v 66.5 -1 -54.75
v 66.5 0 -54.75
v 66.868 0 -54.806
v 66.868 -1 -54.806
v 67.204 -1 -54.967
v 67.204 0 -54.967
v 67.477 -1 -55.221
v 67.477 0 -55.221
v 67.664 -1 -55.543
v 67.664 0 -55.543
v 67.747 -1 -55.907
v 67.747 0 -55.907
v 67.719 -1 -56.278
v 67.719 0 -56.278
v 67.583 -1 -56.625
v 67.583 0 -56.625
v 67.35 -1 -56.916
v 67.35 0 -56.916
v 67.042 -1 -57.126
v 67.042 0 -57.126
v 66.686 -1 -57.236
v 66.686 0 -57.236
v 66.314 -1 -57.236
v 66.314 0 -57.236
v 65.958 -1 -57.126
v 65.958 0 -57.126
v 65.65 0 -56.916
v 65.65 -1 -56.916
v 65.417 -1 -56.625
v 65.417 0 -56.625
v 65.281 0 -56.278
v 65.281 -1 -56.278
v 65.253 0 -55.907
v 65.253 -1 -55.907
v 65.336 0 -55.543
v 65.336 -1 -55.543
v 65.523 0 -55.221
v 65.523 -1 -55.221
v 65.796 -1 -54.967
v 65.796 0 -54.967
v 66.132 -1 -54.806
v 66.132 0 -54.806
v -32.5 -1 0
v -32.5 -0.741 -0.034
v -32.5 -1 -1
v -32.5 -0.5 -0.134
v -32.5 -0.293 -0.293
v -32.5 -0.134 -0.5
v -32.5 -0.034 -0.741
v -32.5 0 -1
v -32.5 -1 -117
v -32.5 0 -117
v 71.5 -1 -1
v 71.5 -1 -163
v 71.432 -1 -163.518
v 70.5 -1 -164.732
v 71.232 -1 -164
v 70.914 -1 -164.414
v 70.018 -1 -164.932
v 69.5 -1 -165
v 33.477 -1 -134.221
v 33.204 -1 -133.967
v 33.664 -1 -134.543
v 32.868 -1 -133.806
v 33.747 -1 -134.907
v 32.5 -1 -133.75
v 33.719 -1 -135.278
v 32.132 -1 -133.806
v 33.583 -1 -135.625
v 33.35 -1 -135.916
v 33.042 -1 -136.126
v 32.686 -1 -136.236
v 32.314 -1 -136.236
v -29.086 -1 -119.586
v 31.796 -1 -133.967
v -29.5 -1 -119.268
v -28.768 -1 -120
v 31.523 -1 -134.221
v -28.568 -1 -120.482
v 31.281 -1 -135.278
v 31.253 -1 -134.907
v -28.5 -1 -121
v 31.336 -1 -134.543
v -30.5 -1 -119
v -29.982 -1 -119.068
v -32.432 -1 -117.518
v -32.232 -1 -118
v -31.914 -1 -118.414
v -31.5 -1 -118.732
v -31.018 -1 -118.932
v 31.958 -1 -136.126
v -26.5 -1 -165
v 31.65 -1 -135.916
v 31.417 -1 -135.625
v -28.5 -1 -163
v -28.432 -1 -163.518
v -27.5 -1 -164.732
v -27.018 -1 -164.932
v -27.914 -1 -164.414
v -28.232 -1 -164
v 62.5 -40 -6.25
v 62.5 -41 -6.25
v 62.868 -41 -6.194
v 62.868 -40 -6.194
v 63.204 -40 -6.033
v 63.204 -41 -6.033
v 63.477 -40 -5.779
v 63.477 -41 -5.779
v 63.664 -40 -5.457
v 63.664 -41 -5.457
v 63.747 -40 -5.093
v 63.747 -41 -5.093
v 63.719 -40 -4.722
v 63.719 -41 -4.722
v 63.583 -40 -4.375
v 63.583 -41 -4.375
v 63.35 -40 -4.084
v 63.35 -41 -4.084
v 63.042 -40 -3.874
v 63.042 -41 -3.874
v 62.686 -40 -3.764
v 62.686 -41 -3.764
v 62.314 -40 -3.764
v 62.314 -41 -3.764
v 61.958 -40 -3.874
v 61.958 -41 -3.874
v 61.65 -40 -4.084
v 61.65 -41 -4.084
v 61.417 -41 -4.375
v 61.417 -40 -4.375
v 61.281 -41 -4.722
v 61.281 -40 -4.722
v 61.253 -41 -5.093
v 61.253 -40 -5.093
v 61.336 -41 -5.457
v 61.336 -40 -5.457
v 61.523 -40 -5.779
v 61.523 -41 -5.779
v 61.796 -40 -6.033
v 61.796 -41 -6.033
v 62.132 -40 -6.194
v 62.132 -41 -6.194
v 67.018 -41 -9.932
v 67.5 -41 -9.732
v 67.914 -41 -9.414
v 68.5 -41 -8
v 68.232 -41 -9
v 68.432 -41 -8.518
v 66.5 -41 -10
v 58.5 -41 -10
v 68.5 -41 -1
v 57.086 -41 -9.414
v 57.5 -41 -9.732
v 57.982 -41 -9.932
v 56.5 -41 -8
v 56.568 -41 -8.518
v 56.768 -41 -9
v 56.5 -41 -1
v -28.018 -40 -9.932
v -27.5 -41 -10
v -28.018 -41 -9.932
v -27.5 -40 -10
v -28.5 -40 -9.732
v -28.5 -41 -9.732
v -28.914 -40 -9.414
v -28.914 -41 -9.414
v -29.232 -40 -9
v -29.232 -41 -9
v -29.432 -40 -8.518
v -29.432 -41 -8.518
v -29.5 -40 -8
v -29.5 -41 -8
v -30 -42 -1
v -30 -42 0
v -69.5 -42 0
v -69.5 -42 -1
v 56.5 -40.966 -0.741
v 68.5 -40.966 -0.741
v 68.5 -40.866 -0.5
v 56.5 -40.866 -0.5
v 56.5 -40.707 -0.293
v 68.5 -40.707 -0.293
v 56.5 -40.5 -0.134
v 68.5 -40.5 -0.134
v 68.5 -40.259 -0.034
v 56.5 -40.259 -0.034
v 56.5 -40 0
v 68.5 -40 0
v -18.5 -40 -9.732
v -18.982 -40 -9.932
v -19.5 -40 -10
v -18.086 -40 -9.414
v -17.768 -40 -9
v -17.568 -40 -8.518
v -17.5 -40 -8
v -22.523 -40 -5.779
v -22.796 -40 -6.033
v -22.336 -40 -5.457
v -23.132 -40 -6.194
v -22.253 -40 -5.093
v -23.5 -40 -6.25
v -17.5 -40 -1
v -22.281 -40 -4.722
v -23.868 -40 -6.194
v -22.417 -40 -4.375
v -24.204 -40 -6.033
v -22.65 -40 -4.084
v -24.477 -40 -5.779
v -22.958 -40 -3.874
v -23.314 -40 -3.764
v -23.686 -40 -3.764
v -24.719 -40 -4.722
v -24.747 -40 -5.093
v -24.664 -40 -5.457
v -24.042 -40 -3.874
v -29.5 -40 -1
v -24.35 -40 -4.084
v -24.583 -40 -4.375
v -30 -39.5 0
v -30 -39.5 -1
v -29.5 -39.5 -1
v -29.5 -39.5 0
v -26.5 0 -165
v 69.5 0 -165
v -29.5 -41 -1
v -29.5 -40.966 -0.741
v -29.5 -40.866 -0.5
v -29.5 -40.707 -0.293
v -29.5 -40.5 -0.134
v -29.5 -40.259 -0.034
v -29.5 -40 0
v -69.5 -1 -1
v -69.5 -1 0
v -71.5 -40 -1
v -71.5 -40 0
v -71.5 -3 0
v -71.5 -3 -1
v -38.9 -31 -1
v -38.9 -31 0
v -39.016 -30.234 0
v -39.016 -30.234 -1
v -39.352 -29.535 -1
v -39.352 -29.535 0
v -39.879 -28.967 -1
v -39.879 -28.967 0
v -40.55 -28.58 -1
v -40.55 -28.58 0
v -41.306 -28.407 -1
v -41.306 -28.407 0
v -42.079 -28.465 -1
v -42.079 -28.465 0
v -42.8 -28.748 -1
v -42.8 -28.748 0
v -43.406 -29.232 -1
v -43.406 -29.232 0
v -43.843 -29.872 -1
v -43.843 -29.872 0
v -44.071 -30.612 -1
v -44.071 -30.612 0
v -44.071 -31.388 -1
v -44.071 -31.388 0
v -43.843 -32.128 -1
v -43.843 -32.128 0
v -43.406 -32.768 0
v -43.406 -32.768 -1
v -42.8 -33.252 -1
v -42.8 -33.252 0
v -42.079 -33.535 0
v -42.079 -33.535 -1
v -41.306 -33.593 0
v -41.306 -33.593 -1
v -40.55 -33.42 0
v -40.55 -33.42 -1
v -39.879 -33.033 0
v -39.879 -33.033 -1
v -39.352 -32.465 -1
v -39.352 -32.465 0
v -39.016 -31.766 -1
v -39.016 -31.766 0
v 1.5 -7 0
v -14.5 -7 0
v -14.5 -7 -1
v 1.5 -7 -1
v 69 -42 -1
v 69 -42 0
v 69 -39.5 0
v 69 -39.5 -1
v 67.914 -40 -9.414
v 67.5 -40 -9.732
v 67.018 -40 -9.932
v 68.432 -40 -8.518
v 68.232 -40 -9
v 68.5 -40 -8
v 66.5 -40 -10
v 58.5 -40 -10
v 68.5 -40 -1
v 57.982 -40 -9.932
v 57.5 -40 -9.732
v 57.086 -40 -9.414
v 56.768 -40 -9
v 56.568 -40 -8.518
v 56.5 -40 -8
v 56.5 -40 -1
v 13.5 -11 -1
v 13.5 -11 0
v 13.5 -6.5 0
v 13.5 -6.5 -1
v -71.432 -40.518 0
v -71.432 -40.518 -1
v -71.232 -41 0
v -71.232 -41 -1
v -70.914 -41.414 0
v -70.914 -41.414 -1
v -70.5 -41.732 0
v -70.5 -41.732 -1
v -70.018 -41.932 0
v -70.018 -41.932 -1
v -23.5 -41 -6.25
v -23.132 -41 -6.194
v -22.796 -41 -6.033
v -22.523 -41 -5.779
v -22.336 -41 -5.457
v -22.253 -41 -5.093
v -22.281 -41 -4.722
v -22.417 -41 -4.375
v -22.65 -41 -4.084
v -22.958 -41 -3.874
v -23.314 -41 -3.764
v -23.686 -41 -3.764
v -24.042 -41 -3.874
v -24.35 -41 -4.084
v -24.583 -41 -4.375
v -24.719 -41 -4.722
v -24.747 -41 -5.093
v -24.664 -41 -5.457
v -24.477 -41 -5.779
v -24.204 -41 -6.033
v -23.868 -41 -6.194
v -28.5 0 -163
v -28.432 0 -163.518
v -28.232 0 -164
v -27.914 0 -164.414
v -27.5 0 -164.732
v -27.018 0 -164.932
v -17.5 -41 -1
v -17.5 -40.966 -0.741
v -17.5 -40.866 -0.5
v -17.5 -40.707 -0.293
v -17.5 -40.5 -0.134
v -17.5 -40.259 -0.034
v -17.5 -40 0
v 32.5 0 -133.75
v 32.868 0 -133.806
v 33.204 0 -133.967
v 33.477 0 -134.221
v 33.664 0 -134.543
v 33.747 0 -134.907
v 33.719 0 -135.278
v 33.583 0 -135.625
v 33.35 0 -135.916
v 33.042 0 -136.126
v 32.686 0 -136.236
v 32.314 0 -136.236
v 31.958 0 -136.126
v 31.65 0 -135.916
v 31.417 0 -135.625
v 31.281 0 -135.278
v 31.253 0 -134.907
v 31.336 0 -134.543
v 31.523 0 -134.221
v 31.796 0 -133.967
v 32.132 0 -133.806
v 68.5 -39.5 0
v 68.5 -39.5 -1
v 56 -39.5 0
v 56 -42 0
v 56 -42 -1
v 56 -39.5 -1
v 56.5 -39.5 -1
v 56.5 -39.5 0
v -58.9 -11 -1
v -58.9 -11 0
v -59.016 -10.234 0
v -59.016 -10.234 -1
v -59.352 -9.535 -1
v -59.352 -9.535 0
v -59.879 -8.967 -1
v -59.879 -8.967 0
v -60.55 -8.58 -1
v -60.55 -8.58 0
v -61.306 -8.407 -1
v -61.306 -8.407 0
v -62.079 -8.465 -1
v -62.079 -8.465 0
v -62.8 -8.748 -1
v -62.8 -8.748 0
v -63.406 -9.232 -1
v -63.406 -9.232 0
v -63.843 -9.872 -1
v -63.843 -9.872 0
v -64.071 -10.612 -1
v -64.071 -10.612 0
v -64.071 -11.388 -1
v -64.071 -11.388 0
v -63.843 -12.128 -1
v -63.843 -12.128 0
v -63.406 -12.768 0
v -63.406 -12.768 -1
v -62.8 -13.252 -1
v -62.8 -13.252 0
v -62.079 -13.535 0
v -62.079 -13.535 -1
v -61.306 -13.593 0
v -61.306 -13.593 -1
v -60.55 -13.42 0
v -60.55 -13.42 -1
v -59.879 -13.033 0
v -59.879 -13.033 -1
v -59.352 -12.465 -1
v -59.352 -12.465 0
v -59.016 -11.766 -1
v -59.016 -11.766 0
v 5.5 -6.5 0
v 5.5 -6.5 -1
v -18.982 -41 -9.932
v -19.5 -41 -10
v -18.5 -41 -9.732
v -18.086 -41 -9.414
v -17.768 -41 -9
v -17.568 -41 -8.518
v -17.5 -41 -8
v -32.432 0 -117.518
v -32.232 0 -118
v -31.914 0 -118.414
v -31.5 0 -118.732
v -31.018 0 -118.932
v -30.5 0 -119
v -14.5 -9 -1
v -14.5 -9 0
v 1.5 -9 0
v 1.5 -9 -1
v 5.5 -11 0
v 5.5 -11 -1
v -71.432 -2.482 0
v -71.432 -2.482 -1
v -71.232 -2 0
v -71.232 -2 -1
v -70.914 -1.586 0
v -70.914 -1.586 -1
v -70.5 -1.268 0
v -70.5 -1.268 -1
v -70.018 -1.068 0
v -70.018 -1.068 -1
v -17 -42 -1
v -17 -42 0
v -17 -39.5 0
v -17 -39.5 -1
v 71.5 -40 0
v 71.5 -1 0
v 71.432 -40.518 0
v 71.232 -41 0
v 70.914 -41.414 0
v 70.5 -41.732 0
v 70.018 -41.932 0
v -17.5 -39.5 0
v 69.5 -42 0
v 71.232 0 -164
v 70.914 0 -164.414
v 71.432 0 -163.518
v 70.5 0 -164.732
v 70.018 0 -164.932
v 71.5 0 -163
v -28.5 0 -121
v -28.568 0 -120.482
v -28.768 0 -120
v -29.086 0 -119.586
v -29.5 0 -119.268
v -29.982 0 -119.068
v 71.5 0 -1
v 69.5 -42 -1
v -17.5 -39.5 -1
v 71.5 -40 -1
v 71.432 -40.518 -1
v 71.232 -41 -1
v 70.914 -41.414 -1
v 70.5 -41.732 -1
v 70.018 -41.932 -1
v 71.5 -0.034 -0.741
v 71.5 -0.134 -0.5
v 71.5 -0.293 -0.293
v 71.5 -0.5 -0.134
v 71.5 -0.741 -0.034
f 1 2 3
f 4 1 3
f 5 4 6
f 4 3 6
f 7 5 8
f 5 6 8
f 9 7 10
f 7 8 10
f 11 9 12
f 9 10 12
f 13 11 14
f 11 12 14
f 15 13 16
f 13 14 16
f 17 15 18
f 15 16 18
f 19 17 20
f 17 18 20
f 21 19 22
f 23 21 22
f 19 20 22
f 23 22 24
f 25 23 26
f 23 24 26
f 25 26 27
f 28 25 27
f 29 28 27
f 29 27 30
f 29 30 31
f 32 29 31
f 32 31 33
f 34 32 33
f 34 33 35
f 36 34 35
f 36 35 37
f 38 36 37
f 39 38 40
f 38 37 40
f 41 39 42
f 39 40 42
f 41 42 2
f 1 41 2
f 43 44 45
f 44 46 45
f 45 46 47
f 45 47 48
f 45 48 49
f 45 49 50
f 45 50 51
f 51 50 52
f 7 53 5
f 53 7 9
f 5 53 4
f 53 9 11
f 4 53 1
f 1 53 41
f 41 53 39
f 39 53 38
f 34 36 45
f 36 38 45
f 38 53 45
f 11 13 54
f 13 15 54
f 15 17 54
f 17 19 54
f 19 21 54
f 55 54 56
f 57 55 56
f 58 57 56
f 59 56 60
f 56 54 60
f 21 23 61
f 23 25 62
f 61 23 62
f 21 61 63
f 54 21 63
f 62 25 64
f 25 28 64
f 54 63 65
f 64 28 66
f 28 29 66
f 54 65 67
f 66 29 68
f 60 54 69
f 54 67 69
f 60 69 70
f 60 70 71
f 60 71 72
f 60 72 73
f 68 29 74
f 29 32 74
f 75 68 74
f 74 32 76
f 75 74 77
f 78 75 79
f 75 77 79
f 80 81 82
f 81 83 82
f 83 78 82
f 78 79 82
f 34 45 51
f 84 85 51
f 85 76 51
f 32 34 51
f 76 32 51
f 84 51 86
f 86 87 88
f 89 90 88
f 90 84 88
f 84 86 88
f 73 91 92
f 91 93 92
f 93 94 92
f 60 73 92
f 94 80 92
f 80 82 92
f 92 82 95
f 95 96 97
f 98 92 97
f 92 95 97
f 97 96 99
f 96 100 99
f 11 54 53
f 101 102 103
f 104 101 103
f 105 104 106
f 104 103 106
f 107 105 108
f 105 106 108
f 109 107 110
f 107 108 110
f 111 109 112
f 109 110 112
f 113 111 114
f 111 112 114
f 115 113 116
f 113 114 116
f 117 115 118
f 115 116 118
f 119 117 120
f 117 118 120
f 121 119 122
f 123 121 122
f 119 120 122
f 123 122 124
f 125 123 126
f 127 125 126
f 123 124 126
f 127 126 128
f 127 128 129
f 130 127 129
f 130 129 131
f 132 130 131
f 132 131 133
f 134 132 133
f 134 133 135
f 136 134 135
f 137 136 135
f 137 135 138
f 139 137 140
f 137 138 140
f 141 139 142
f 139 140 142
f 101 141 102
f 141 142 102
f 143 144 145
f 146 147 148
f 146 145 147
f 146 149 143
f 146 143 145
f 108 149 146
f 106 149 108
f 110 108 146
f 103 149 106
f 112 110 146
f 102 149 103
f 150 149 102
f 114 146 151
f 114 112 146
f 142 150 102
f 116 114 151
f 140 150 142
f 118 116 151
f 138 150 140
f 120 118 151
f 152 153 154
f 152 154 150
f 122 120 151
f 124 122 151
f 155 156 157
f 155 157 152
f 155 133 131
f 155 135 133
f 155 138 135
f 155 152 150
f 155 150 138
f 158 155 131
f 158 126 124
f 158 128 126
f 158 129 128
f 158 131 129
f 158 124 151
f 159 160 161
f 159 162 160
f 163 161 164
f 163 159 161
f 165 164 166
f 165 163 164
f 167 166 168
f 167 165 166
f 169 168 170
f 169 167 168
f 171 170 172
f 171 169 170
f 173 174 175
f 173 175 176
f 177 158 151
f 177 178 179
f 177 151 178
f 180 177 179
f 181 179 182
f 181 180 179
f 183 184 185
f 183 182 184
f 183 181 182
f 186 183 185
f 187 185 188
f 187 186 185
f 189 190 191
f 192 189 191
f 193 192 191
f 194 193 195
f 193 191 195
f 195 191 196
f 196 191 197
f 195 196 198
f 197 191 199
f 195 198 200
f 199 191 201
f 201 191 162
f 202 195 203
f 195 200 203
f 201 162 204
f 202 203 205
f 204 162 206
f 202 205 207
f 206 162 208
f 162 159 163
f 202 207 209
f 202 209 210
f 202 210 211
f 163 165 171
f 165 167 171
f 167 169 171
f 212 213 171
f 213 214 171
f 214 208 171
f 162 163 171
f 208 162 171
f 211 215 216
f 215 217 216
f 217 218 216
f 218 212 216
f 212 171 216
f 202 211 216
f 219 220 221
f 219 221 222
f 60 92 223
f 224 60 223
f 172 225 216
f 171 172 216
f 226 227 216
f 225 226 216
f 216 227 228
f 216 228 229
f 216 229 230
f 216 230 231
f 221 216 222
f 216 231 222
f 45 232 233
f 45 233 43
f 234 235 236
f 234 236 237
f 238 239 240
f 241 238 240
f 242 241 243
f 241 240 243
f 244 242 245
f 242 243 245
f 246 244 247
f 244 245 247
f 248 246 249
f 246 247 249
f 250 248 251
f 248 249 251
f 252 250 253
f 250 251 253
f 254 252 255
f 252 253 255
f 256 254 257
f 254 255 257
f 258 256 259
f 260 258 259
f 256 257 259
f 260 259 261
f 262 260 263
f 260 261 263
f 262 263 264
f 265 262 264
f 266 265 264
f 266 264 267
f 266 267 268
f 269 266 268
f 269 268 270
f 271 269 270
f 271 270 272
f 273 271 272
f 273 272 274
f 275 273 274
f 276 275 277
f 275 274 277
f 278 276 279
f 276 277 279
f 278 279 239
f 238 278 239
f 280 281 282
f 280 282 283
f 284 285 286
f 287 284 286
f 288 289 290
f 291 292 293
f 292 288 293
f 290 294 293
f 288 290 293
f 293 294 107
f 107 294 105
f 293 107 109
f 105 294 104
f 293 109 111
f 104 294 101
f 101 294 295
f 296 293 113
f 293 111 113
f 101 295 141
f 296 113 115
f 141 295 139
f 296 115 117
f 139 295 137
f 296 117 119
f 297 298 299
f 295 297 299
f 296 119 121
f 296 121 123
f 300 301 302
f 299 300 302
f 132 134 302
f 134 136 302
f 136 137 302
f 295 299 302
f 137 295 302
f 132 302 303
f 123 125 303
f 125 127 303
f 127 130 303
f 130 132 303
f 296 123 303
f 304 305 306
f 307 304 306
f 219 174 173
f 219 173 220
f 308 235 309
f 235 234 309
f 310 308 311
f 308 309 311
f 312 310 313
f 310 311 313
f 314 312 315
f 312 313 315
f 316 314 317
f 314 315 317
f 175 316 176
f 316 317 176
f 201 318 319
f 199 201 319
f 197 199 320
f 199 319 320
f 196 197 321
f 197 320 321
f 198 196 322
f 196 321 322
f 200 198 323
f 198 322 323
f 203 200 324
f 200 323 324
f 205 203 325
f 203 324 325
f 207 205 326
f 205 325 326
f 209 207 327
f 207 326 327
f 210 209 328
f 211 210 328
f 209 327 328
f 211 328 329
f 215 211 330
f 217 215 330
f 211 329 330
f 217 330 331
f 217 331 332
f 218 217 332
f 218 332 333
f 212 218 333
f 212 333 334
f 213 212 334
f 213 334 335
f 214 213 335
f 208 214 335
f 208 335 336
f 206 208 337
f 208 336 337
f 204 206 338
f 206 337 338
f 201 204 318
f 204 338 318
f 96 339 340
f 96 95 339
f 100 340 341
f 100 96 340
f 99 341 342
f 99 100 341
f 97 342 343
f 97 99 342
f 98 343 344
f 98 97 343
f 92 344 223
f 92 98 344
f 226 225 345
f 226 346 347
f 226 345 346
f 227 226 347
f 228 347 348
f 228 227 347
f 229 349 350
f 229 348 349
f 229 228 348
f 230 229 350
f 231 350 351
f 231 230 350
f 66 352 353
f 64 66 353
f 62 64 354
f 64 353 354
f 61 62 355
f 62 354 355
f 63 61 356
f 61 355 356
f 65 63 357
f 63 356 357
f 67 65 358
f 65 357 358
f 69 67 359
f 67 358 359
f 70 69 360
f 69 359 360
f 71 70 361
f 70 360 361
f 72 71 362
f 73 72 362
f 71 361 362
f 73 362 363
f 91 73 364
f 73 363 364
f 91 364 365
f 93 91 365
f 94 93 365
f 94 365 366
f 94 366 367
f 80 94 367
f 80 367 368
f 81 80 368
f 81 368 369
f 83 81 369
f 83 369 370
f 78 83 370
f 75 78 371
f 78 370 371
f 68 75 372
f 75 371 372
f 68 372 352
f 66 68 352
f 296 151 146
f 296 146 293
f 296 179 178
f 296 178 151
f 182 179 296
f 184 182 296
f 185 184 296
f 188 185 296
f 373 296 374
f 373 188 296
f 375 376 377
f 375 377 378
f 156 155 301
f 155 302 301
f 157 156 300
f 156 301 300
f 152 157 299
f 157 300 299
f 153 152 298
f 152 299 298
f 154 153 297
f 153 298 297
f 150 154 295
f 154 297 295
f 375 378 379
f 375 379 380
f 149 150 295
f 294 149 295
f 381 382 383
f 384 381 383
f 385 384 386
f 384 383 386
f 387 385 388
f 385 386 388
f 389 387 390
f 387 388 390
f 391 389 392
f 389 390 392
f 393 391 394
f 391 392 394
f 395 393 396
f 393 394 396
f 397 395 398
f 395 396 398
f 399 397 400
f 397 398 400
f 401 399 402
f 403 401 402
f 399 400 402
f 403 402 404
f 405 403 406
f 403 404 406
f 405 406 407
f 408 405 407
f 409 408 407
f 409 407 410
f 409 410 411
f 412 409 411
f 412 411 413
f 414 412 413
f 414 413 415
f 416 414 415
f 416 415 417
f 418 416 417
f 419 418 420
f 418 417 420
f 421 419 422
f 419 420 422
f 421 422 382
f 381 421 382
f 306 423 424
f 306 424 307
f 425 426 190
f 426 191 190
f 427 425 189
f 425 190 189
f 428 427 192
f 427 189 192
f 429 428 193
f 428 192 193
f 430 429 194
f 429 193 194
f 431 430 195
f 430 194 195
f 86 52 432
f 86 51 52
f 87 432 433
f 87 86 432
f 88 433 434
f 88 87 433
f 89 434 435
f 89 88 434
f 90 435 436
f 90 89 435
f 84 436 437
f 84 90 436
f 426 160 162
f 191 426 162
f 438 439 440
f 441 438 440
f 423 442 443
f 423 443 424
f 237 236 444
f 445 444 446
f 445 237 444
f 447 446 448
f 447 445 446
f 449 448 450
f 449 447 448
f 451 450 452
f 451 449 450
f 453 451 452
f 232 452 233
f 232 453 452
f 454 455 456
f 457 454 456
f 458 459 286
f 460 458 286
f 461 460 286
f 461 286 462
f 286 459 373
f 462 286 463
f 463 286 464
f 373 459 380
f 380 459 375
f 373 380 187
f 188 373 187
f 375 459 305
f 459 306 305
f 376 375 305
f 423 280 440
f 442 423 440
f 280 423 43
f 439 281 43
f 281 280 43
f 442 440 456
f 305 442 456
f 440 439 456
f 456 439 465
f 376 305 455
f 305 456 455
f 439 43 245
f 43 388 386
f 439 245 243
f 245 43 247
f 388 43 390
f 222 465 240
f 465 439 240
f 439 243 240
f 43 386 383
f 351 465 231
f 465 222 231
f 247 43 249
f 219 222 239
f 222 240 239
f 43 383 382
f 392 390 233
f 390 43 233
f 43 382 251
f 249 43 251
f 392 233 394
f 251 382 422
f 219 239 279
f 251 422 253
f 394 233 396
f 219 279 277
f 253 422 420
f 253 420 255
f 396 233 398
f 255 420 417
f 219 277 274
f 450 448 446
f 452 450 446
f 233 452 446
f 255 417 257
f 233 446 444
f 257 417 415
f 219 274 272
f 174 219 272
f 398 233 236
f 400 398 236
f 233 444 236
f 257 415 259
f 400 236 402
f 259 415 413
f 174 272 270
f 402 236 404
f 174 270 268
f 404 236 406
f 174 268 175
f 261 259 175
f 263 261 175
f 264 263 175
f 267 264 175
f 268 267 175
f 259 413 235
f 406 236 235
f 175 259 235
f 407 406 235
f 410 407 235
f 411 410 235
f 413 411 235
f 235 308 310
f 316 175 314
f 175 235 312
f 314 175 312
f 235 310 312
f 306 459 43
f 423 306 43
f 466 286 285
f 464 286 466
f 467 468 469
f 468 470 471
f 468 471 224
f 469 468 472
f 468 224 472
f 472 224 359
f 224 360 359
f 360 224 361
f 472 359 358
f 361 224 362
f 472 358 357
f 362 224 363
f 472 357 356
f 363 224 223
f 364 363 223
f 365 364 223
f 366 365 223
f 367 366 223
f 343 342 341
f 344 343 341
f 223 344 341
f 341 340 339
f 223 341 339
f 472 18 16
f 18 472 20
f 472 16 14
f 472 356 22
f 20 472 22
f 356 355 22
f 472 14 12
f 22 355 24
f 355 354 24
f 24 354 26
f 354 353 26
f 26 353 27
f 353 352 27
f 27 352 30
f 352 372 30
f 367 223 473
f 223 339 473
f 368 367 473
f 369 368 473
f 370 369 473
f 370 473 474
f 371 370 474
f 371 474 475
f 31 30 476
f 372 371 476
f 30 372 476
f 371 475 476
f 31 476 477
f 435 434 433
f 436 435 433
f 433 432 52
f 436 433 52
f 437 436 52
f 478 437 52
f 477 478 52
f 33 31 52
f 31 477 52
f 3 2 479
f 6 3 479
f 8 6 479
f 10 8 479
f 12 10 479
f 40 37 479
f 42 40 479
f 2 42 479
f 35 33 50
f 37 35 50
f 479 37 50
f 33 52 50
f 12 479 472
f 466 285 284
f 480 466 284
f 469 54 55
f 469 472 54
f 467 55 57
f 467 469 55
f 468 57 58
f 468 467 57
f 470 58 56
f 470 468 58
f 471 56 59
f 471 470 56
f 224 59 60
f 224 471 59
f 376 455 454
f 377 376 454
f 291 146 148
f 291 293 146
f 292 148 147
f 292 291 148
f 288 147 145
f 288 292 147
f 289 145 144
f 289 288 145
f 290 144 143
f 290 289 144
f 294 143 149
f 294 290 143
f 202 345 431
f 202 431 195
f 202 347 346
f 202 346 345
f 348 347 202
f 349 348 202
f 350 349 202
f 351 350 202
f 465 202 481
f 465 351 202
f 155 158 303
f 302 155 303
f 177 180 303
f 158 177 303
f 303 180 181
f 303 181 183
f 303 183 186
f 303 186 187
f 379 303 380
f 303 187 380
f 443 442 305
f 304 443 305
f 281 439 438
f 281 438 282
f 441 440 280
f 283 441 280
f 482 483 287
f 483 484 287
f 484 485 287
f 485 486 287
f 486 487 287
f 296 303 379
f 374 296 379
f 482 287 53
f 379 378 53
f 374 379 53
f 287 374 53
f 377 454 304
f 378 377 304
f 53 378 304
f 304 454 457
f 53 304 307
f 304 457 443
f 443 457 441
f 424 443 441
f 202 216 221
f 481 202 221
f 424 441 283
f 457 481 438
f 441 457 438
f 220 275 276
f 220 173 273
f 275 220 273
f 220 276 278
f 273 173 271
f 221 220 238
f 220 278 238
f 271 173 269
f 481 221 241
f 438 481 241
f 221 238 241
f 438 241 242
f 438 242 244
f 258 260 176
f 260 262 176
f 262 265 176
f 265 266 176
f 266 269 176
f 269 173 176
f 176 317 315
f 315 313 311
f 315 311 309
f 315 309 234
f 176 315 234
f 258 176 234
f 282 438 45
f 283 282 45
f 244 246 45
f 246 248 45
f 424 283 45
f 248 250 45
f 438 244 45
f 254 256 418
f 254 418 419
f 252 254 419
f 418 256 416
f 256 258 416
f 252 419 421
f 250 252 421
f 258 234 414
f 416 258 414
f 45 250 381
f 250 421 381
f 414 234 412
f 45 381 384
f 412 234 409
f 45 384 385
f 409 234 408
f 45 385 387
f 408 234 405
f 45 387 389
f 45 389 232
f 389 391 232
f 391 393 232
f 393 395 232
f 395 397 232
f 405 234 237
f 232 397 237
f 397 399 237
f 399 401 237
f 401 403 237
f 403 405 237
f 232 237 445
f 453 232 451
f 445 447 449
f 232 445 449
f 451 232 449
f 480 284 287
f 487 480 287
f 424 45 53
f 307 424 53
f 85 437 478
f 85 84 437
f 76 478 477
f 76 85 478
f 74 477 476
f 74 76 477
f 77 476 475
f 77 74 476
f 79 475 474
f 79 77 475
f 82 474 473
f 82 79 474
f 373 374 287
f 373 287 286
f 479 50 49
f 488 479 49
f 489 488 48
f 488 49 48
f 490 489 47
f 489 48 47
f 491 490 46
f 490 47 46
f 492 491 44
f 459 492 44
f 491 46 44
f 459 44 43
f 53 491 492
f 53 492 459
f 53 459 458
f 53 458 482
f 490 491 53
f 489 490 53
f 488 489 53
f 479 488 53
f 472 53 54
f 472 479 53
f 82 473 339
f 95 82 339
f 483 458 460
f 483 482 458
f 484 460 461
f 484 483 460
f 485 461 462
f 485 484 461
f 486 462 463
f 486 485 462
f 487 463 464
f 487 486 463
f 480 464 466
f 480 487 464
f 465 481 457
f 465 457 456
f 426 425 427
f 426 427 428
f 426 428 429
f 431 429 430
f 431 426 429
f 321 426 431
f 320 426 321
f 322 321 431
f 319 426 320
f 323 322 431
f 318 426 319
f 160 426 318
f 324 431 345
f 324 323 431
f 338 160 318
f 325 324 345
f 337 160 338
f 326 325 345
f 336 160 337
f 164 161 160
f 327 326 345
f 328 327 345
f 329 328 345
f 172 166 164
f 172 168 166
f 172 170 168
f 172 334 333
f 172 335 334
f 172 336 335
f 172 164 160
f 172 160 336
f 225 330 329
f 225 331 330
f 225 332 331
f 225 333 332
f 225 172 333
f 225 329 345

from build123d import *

# Parameters (mm, degrees)
BASE_FLANGE1_START       = -71.5
BASE_FLANGE1_DEPTH       = 143
SKETCH6_W                = 39
SKETCH6_H                = 165
CUT_EXTRUDE1_DEPTH       = 1
SKETCH7_W                = 4
SKETCH7_H                = 46
CUT_EXTRUDE2_DEPTH       = 10
SKETCH8_R                = 2.6
CUT_EXTRUDE3_DEPTH       = 1
SKETCH9_W                = 16
SKETCH9_H                = 2
SKETCH9_W_2              = 8
SKETCH9_H_2              = 4.5
CUT_EXTRUDE4_DEPTH       = 185.66523766
SKETCH10_R               = 1.25
CUT_EXTRUDE5_DEPTH       = 1
EDGE_FLANGE1_START       = 56
EDGE_FLANGE1_DEPTH       = 13
EDGE_FLANGE1_2_DEPTH     = 0.5
EDGE_FLANGE1_START_2     = 68.5
EDGE_FLANGE1_3_DEPTH     = 0.5
EDGE_FLANGE1_START_3     = 56.5
EDGE_FLANGE1_4_OUTLINE_W = 1
EDGE_FLANGE1_4_OUTLINE_H = 9
EDGE_FLANGE1_4_DEPTH     = 12
EDGE_FLANGE2_START       = -30
EDGE_FLANGE2_DEPTH       = 13
EDGE_FLANGE2_2_DEPTH     = 0.5
EDGE_FLANGE2_START_2     = -17.5
EDGE_FLANGE2_3_DEPTH     = 0.5
EDGE_FLANGE2_START_3     = -29.5
EDGE_FLANGE2_4_OUTLINE_W = 1
EDGE_FLANGE2_4_OUTLINE_H = 9
EDGE_FLANGE2_4_DEPTH     = 12
SKETCH17_R               = 1.25
CUT_EXTRUDE6_DEPTH       = 1
FILLET1_R                = 2


# Read off the part's stored shape, not the designer's step: Base-Flange1, Edge-Flange1, Edge-Flange2
with BuildPart() as part:
    # Base-Flange1 outline → Base-Flange1 (new body)
    with BuildSketch(Plane(origin=(0, 0, 0), x_dir=(0, 0, -1), z_dir=(1, 0, 0)).offset(BASE_FLANGE1_START)):
        with BuildLine():
            Line((1, -1), (165, -1))
            Line((165, -1), (165, 0))
            Line((165, 0), (1, 0))
            ThreePointArc((1, 0), (0.292893219, -0.292893219), (0, -1))
            Line((0, -1), (0, -42))
            Line((0, -42), (1, -42))
            Line((1, -42), (1, -1))
        make_face()
    extrude(amount=BASE_FLANGE1_DEPTH)

    # Sketch6 → Cut-Extrude1 (cut)
    with BuildSketch(Plane(origin=(0, 0, 0), x_dir=(1, 0, 0), z_dir=(0, 1, 0))):
        with Locations((-52, 82.5)):
            Rectangle(SKETCH6_W, SKETCH6_H)
    extrude(amount=-CUT_EXTRUDE1_DEPTH, mode=Mode.SUBTRACT)

    # Sketch7 → Cut-Extrude2 (cut)
    with BuildSketch(Plane(origin=(0, 0, 0), x_dir=(1, 0, 0), z_dir=(0, 1, 0))):
        with Locations((-30.5, 142)):
            Rectangle(SKETCH7_W, SKETCH7_H)
    extrude(amount=-CUT_EXTRUDE2_DEPTH, mode=Mode.SUBTRACT)

    # Sketch8 → Cut-Extrude3 (cut)
    with BuildSketch(Plane.XY):
        with Locations((-61.5, -11)):
            Circle(SKETCH8_R)
        with Locations((-41.5, -31)):
            Circle(SKETCH8_R)
    extrude(amount=-CUT_EXTRUDE3_DEPTH, mode=Mode.SUBTRACT)

    # Sketch9 → Cut-Extrude4 (cut, through all)
    with BuildSketch(Plane.XY):
        with Locations((-6.5, -8)):
            Rectangle(SKETCH9_W, SKETCH9_H)
        with Locations((9.5, -8.75)):
            Rectangle(SKETCH9_W_2, SKETCH9_H_2)
    extrude(amount=-CUT_EXTRUDE4_DEPTH, mode=Mode.SUBTRACT)

    # Sketch10 → Cut-Extrude5 (cut)
    with BuildSketch(Plane(origin=(0, 0, 0), x_dir=(1, 0, 0), z_dir=(0, 1, 0))):
        with Locations(Location((66.5, 56, 0), (0, 0, 270))):
            Circle(SKETCH10_R)
        with Locations(Location((32.5, 135, 0), (0, 0, 270))):
            Circle(SKETCH10_R)
    extrude(amount=-CUT_EXTRUDE5_DEPTH, mode=Mode.SUBTRACT)

    # Edge-Flange1 outline → Edge-Flange1 (cut)
    with BuildSketch(Plane.YZ.offset(EDGE_FLANGE1_START)):
        with BuildLine():
            ThreePointArc((-41, -1), (-40.707106781, -0.292893219), (-40, 0))
            Line((-40, 0), (-42, 0))
            Line((-42, 0), (-42, -1))
            Line((-42, -1), (-41, -1))
        make_face()
    extrude(amount=EDGE_FLANGE1_DEPTH, mode=Mode.SUBTRACT)

    # Edge-Flange1 2 outline → Edge-Flange1 2 (cut)
    with BuildSketch(Plane.YZ.offset(EDGE_FLANGE1_START)):
        with BuildLine():
            Line((-39.5, -1), (-39.5, 0))
            Line((-39.5, 0), (-40, 0))
            ThreePointArc((-40, 0), (-40.707106781, -0.292893219), (-41, -1))
            Line((-41, -1), (-39.5, -1))
        make_face()
    extrude(amount=EDGE_FLANGE1_2_DEPTH, mode=Mode.SUBTRACT)

    # Edge-Flange1 3 outline → Edge-Flange1 3 (cut)
    with BuildSketch(Plane.YZ.offset(EDGE_FLANGE1_START_2)):
        with BuildLine():
            Line((-39.5, -1), (-39.5, 0))
            Line((-39.5, 0), (-40, 0))
            ThreePointArc((-40, 0), (-40.707106781, -0.292893219), (-41, -1))
            Line((-41, -1), (-39.5, -1))
        make_face()
    extrude(amount=EDGE_FLANGE1_3_DEPTH, mode=Mode.SUBTRACT)

    # Edge-Flange1 4 outline → Edge-Flange1 4 (add)
    with BuildSketch(Plane.YZ.offset(EDGE_FLANGE1_START_3)):
        with Locations((-40.5, -5.5)):
            Rectangle(EDGE_FLANGE1_4_OUTLINE_W, EDGE_FLANGE1_4_OUTLINE_H)
    extrude(amount=EDGE_FLANGE1_4_DEPTH)

    # Edge-Flange2 outline → Edge-Flange2 (cut)
    with BuildSketch(Plane.YZ.offset(EDGE_FLANGE2_START)):
        with BuildLine():
            ThreePointArc((-41, -1), (-40.707106781, -0.292893219), (-40, 0))
            Line((-40, 0), (-42, 0))
            Line((-42, 0), (-42, -1))
            Line((-42, -1), (-41, -1))
        make_face()
    extrude(amount=EDGE_FLANGE2_DEPTH, mode=Mode.SUBTRACT)

    # Edge-Flange2 2 outline → Edge-Flange2 2 (cut)
    with BuildSketch(Plane.YZ.offset(EDGE_FLANGE2_START)):
        with BuildLine():
            Line((-39.5, -1), (-39.5, 0))
            Line((-39.5, 0), (-40, 0))
            ThreePointArc((-40, 0), (-40.707106781, -0.292893219), (-41, -1))
            Line((-41, -1), (-39.5, -1))
        make_face()
    extrude(amount=EDGE_FLANGE2_2_DEPTH, mode=Mode.SUBTRACT)

    # Edge-Flange2 3 outline → Edge-Flange2 3 (cut)
    with BuildSketch(Plane.YZ.offset(EDGE_FLANGE2_START_2)):
        with BuildLine():
            Line((-39.5, -1), (-39.5, 0))
            Line((-39.5, 0), (-40, 0))
            ThreePointArc((-40, 0), (-40.707106781, -0.292893219), (-41, -1))
            Line((-41, -1), (-39.5, -1))
        make_face()
    extrude(amount=EDGE_FLANGE2_3_DEPTH, mode=Mode.SUBTRACT)

    # Edge-Flange2 4 outline → Edge-Flange2 4 (add)
    with BuildSketch(Plane.YZ.offset(EDGE_FLANGE2_START_3)):
        with Locations((-40.5, -5.5)):
            Rectangle(EDGE_FLANGE2_4_OUTLINE_W, EDGE_FLANGE2_4_OUTLINE_H)
    extrude(amount=EDGE_FLANGE2_4_DEPTH)

    # Sketch17 → Cut-Extrude6 (cut)
    with BuildSketch(Plane.XZ.offset(41)):
        with Locations(Location((-23.5, -5, 0), (0, 0, 270))):
            Circle(SKETCH17_R)
        with Locations(Location((62.5, -5, 0), (0, 0, 270))):
            Circle(SKETCH17_R)
    extrude(amount=-CUT_EXTRUDE6_DEPTH, mode=Mode.SUBTRACT)

    # Fillet1
    fillet1_edges = [part.edges().sort_by_distance(p)[0] for p in [
        (71.5, -42, -0.5),
        (71.5, -0.5, -165),
        (-28.5, -0.5, -165),
        (-28.5, -0.5, -119),
        (-32.5, -0.5, -119),
        (-71.5, -42, -0.5),
        (-71.5, -1, -0.5),
        (-29.5, -40.5, -10),
        (-17.5, -40.5, -10),
        (56.5, -40.5, -10),
        (68.5, -40.5, -10),
    ]]
    fillet(fillet1_edges, radius=FILLET1_R - 0.0001)  # a hair under: the kernel refuses the full size


solid = part.part
